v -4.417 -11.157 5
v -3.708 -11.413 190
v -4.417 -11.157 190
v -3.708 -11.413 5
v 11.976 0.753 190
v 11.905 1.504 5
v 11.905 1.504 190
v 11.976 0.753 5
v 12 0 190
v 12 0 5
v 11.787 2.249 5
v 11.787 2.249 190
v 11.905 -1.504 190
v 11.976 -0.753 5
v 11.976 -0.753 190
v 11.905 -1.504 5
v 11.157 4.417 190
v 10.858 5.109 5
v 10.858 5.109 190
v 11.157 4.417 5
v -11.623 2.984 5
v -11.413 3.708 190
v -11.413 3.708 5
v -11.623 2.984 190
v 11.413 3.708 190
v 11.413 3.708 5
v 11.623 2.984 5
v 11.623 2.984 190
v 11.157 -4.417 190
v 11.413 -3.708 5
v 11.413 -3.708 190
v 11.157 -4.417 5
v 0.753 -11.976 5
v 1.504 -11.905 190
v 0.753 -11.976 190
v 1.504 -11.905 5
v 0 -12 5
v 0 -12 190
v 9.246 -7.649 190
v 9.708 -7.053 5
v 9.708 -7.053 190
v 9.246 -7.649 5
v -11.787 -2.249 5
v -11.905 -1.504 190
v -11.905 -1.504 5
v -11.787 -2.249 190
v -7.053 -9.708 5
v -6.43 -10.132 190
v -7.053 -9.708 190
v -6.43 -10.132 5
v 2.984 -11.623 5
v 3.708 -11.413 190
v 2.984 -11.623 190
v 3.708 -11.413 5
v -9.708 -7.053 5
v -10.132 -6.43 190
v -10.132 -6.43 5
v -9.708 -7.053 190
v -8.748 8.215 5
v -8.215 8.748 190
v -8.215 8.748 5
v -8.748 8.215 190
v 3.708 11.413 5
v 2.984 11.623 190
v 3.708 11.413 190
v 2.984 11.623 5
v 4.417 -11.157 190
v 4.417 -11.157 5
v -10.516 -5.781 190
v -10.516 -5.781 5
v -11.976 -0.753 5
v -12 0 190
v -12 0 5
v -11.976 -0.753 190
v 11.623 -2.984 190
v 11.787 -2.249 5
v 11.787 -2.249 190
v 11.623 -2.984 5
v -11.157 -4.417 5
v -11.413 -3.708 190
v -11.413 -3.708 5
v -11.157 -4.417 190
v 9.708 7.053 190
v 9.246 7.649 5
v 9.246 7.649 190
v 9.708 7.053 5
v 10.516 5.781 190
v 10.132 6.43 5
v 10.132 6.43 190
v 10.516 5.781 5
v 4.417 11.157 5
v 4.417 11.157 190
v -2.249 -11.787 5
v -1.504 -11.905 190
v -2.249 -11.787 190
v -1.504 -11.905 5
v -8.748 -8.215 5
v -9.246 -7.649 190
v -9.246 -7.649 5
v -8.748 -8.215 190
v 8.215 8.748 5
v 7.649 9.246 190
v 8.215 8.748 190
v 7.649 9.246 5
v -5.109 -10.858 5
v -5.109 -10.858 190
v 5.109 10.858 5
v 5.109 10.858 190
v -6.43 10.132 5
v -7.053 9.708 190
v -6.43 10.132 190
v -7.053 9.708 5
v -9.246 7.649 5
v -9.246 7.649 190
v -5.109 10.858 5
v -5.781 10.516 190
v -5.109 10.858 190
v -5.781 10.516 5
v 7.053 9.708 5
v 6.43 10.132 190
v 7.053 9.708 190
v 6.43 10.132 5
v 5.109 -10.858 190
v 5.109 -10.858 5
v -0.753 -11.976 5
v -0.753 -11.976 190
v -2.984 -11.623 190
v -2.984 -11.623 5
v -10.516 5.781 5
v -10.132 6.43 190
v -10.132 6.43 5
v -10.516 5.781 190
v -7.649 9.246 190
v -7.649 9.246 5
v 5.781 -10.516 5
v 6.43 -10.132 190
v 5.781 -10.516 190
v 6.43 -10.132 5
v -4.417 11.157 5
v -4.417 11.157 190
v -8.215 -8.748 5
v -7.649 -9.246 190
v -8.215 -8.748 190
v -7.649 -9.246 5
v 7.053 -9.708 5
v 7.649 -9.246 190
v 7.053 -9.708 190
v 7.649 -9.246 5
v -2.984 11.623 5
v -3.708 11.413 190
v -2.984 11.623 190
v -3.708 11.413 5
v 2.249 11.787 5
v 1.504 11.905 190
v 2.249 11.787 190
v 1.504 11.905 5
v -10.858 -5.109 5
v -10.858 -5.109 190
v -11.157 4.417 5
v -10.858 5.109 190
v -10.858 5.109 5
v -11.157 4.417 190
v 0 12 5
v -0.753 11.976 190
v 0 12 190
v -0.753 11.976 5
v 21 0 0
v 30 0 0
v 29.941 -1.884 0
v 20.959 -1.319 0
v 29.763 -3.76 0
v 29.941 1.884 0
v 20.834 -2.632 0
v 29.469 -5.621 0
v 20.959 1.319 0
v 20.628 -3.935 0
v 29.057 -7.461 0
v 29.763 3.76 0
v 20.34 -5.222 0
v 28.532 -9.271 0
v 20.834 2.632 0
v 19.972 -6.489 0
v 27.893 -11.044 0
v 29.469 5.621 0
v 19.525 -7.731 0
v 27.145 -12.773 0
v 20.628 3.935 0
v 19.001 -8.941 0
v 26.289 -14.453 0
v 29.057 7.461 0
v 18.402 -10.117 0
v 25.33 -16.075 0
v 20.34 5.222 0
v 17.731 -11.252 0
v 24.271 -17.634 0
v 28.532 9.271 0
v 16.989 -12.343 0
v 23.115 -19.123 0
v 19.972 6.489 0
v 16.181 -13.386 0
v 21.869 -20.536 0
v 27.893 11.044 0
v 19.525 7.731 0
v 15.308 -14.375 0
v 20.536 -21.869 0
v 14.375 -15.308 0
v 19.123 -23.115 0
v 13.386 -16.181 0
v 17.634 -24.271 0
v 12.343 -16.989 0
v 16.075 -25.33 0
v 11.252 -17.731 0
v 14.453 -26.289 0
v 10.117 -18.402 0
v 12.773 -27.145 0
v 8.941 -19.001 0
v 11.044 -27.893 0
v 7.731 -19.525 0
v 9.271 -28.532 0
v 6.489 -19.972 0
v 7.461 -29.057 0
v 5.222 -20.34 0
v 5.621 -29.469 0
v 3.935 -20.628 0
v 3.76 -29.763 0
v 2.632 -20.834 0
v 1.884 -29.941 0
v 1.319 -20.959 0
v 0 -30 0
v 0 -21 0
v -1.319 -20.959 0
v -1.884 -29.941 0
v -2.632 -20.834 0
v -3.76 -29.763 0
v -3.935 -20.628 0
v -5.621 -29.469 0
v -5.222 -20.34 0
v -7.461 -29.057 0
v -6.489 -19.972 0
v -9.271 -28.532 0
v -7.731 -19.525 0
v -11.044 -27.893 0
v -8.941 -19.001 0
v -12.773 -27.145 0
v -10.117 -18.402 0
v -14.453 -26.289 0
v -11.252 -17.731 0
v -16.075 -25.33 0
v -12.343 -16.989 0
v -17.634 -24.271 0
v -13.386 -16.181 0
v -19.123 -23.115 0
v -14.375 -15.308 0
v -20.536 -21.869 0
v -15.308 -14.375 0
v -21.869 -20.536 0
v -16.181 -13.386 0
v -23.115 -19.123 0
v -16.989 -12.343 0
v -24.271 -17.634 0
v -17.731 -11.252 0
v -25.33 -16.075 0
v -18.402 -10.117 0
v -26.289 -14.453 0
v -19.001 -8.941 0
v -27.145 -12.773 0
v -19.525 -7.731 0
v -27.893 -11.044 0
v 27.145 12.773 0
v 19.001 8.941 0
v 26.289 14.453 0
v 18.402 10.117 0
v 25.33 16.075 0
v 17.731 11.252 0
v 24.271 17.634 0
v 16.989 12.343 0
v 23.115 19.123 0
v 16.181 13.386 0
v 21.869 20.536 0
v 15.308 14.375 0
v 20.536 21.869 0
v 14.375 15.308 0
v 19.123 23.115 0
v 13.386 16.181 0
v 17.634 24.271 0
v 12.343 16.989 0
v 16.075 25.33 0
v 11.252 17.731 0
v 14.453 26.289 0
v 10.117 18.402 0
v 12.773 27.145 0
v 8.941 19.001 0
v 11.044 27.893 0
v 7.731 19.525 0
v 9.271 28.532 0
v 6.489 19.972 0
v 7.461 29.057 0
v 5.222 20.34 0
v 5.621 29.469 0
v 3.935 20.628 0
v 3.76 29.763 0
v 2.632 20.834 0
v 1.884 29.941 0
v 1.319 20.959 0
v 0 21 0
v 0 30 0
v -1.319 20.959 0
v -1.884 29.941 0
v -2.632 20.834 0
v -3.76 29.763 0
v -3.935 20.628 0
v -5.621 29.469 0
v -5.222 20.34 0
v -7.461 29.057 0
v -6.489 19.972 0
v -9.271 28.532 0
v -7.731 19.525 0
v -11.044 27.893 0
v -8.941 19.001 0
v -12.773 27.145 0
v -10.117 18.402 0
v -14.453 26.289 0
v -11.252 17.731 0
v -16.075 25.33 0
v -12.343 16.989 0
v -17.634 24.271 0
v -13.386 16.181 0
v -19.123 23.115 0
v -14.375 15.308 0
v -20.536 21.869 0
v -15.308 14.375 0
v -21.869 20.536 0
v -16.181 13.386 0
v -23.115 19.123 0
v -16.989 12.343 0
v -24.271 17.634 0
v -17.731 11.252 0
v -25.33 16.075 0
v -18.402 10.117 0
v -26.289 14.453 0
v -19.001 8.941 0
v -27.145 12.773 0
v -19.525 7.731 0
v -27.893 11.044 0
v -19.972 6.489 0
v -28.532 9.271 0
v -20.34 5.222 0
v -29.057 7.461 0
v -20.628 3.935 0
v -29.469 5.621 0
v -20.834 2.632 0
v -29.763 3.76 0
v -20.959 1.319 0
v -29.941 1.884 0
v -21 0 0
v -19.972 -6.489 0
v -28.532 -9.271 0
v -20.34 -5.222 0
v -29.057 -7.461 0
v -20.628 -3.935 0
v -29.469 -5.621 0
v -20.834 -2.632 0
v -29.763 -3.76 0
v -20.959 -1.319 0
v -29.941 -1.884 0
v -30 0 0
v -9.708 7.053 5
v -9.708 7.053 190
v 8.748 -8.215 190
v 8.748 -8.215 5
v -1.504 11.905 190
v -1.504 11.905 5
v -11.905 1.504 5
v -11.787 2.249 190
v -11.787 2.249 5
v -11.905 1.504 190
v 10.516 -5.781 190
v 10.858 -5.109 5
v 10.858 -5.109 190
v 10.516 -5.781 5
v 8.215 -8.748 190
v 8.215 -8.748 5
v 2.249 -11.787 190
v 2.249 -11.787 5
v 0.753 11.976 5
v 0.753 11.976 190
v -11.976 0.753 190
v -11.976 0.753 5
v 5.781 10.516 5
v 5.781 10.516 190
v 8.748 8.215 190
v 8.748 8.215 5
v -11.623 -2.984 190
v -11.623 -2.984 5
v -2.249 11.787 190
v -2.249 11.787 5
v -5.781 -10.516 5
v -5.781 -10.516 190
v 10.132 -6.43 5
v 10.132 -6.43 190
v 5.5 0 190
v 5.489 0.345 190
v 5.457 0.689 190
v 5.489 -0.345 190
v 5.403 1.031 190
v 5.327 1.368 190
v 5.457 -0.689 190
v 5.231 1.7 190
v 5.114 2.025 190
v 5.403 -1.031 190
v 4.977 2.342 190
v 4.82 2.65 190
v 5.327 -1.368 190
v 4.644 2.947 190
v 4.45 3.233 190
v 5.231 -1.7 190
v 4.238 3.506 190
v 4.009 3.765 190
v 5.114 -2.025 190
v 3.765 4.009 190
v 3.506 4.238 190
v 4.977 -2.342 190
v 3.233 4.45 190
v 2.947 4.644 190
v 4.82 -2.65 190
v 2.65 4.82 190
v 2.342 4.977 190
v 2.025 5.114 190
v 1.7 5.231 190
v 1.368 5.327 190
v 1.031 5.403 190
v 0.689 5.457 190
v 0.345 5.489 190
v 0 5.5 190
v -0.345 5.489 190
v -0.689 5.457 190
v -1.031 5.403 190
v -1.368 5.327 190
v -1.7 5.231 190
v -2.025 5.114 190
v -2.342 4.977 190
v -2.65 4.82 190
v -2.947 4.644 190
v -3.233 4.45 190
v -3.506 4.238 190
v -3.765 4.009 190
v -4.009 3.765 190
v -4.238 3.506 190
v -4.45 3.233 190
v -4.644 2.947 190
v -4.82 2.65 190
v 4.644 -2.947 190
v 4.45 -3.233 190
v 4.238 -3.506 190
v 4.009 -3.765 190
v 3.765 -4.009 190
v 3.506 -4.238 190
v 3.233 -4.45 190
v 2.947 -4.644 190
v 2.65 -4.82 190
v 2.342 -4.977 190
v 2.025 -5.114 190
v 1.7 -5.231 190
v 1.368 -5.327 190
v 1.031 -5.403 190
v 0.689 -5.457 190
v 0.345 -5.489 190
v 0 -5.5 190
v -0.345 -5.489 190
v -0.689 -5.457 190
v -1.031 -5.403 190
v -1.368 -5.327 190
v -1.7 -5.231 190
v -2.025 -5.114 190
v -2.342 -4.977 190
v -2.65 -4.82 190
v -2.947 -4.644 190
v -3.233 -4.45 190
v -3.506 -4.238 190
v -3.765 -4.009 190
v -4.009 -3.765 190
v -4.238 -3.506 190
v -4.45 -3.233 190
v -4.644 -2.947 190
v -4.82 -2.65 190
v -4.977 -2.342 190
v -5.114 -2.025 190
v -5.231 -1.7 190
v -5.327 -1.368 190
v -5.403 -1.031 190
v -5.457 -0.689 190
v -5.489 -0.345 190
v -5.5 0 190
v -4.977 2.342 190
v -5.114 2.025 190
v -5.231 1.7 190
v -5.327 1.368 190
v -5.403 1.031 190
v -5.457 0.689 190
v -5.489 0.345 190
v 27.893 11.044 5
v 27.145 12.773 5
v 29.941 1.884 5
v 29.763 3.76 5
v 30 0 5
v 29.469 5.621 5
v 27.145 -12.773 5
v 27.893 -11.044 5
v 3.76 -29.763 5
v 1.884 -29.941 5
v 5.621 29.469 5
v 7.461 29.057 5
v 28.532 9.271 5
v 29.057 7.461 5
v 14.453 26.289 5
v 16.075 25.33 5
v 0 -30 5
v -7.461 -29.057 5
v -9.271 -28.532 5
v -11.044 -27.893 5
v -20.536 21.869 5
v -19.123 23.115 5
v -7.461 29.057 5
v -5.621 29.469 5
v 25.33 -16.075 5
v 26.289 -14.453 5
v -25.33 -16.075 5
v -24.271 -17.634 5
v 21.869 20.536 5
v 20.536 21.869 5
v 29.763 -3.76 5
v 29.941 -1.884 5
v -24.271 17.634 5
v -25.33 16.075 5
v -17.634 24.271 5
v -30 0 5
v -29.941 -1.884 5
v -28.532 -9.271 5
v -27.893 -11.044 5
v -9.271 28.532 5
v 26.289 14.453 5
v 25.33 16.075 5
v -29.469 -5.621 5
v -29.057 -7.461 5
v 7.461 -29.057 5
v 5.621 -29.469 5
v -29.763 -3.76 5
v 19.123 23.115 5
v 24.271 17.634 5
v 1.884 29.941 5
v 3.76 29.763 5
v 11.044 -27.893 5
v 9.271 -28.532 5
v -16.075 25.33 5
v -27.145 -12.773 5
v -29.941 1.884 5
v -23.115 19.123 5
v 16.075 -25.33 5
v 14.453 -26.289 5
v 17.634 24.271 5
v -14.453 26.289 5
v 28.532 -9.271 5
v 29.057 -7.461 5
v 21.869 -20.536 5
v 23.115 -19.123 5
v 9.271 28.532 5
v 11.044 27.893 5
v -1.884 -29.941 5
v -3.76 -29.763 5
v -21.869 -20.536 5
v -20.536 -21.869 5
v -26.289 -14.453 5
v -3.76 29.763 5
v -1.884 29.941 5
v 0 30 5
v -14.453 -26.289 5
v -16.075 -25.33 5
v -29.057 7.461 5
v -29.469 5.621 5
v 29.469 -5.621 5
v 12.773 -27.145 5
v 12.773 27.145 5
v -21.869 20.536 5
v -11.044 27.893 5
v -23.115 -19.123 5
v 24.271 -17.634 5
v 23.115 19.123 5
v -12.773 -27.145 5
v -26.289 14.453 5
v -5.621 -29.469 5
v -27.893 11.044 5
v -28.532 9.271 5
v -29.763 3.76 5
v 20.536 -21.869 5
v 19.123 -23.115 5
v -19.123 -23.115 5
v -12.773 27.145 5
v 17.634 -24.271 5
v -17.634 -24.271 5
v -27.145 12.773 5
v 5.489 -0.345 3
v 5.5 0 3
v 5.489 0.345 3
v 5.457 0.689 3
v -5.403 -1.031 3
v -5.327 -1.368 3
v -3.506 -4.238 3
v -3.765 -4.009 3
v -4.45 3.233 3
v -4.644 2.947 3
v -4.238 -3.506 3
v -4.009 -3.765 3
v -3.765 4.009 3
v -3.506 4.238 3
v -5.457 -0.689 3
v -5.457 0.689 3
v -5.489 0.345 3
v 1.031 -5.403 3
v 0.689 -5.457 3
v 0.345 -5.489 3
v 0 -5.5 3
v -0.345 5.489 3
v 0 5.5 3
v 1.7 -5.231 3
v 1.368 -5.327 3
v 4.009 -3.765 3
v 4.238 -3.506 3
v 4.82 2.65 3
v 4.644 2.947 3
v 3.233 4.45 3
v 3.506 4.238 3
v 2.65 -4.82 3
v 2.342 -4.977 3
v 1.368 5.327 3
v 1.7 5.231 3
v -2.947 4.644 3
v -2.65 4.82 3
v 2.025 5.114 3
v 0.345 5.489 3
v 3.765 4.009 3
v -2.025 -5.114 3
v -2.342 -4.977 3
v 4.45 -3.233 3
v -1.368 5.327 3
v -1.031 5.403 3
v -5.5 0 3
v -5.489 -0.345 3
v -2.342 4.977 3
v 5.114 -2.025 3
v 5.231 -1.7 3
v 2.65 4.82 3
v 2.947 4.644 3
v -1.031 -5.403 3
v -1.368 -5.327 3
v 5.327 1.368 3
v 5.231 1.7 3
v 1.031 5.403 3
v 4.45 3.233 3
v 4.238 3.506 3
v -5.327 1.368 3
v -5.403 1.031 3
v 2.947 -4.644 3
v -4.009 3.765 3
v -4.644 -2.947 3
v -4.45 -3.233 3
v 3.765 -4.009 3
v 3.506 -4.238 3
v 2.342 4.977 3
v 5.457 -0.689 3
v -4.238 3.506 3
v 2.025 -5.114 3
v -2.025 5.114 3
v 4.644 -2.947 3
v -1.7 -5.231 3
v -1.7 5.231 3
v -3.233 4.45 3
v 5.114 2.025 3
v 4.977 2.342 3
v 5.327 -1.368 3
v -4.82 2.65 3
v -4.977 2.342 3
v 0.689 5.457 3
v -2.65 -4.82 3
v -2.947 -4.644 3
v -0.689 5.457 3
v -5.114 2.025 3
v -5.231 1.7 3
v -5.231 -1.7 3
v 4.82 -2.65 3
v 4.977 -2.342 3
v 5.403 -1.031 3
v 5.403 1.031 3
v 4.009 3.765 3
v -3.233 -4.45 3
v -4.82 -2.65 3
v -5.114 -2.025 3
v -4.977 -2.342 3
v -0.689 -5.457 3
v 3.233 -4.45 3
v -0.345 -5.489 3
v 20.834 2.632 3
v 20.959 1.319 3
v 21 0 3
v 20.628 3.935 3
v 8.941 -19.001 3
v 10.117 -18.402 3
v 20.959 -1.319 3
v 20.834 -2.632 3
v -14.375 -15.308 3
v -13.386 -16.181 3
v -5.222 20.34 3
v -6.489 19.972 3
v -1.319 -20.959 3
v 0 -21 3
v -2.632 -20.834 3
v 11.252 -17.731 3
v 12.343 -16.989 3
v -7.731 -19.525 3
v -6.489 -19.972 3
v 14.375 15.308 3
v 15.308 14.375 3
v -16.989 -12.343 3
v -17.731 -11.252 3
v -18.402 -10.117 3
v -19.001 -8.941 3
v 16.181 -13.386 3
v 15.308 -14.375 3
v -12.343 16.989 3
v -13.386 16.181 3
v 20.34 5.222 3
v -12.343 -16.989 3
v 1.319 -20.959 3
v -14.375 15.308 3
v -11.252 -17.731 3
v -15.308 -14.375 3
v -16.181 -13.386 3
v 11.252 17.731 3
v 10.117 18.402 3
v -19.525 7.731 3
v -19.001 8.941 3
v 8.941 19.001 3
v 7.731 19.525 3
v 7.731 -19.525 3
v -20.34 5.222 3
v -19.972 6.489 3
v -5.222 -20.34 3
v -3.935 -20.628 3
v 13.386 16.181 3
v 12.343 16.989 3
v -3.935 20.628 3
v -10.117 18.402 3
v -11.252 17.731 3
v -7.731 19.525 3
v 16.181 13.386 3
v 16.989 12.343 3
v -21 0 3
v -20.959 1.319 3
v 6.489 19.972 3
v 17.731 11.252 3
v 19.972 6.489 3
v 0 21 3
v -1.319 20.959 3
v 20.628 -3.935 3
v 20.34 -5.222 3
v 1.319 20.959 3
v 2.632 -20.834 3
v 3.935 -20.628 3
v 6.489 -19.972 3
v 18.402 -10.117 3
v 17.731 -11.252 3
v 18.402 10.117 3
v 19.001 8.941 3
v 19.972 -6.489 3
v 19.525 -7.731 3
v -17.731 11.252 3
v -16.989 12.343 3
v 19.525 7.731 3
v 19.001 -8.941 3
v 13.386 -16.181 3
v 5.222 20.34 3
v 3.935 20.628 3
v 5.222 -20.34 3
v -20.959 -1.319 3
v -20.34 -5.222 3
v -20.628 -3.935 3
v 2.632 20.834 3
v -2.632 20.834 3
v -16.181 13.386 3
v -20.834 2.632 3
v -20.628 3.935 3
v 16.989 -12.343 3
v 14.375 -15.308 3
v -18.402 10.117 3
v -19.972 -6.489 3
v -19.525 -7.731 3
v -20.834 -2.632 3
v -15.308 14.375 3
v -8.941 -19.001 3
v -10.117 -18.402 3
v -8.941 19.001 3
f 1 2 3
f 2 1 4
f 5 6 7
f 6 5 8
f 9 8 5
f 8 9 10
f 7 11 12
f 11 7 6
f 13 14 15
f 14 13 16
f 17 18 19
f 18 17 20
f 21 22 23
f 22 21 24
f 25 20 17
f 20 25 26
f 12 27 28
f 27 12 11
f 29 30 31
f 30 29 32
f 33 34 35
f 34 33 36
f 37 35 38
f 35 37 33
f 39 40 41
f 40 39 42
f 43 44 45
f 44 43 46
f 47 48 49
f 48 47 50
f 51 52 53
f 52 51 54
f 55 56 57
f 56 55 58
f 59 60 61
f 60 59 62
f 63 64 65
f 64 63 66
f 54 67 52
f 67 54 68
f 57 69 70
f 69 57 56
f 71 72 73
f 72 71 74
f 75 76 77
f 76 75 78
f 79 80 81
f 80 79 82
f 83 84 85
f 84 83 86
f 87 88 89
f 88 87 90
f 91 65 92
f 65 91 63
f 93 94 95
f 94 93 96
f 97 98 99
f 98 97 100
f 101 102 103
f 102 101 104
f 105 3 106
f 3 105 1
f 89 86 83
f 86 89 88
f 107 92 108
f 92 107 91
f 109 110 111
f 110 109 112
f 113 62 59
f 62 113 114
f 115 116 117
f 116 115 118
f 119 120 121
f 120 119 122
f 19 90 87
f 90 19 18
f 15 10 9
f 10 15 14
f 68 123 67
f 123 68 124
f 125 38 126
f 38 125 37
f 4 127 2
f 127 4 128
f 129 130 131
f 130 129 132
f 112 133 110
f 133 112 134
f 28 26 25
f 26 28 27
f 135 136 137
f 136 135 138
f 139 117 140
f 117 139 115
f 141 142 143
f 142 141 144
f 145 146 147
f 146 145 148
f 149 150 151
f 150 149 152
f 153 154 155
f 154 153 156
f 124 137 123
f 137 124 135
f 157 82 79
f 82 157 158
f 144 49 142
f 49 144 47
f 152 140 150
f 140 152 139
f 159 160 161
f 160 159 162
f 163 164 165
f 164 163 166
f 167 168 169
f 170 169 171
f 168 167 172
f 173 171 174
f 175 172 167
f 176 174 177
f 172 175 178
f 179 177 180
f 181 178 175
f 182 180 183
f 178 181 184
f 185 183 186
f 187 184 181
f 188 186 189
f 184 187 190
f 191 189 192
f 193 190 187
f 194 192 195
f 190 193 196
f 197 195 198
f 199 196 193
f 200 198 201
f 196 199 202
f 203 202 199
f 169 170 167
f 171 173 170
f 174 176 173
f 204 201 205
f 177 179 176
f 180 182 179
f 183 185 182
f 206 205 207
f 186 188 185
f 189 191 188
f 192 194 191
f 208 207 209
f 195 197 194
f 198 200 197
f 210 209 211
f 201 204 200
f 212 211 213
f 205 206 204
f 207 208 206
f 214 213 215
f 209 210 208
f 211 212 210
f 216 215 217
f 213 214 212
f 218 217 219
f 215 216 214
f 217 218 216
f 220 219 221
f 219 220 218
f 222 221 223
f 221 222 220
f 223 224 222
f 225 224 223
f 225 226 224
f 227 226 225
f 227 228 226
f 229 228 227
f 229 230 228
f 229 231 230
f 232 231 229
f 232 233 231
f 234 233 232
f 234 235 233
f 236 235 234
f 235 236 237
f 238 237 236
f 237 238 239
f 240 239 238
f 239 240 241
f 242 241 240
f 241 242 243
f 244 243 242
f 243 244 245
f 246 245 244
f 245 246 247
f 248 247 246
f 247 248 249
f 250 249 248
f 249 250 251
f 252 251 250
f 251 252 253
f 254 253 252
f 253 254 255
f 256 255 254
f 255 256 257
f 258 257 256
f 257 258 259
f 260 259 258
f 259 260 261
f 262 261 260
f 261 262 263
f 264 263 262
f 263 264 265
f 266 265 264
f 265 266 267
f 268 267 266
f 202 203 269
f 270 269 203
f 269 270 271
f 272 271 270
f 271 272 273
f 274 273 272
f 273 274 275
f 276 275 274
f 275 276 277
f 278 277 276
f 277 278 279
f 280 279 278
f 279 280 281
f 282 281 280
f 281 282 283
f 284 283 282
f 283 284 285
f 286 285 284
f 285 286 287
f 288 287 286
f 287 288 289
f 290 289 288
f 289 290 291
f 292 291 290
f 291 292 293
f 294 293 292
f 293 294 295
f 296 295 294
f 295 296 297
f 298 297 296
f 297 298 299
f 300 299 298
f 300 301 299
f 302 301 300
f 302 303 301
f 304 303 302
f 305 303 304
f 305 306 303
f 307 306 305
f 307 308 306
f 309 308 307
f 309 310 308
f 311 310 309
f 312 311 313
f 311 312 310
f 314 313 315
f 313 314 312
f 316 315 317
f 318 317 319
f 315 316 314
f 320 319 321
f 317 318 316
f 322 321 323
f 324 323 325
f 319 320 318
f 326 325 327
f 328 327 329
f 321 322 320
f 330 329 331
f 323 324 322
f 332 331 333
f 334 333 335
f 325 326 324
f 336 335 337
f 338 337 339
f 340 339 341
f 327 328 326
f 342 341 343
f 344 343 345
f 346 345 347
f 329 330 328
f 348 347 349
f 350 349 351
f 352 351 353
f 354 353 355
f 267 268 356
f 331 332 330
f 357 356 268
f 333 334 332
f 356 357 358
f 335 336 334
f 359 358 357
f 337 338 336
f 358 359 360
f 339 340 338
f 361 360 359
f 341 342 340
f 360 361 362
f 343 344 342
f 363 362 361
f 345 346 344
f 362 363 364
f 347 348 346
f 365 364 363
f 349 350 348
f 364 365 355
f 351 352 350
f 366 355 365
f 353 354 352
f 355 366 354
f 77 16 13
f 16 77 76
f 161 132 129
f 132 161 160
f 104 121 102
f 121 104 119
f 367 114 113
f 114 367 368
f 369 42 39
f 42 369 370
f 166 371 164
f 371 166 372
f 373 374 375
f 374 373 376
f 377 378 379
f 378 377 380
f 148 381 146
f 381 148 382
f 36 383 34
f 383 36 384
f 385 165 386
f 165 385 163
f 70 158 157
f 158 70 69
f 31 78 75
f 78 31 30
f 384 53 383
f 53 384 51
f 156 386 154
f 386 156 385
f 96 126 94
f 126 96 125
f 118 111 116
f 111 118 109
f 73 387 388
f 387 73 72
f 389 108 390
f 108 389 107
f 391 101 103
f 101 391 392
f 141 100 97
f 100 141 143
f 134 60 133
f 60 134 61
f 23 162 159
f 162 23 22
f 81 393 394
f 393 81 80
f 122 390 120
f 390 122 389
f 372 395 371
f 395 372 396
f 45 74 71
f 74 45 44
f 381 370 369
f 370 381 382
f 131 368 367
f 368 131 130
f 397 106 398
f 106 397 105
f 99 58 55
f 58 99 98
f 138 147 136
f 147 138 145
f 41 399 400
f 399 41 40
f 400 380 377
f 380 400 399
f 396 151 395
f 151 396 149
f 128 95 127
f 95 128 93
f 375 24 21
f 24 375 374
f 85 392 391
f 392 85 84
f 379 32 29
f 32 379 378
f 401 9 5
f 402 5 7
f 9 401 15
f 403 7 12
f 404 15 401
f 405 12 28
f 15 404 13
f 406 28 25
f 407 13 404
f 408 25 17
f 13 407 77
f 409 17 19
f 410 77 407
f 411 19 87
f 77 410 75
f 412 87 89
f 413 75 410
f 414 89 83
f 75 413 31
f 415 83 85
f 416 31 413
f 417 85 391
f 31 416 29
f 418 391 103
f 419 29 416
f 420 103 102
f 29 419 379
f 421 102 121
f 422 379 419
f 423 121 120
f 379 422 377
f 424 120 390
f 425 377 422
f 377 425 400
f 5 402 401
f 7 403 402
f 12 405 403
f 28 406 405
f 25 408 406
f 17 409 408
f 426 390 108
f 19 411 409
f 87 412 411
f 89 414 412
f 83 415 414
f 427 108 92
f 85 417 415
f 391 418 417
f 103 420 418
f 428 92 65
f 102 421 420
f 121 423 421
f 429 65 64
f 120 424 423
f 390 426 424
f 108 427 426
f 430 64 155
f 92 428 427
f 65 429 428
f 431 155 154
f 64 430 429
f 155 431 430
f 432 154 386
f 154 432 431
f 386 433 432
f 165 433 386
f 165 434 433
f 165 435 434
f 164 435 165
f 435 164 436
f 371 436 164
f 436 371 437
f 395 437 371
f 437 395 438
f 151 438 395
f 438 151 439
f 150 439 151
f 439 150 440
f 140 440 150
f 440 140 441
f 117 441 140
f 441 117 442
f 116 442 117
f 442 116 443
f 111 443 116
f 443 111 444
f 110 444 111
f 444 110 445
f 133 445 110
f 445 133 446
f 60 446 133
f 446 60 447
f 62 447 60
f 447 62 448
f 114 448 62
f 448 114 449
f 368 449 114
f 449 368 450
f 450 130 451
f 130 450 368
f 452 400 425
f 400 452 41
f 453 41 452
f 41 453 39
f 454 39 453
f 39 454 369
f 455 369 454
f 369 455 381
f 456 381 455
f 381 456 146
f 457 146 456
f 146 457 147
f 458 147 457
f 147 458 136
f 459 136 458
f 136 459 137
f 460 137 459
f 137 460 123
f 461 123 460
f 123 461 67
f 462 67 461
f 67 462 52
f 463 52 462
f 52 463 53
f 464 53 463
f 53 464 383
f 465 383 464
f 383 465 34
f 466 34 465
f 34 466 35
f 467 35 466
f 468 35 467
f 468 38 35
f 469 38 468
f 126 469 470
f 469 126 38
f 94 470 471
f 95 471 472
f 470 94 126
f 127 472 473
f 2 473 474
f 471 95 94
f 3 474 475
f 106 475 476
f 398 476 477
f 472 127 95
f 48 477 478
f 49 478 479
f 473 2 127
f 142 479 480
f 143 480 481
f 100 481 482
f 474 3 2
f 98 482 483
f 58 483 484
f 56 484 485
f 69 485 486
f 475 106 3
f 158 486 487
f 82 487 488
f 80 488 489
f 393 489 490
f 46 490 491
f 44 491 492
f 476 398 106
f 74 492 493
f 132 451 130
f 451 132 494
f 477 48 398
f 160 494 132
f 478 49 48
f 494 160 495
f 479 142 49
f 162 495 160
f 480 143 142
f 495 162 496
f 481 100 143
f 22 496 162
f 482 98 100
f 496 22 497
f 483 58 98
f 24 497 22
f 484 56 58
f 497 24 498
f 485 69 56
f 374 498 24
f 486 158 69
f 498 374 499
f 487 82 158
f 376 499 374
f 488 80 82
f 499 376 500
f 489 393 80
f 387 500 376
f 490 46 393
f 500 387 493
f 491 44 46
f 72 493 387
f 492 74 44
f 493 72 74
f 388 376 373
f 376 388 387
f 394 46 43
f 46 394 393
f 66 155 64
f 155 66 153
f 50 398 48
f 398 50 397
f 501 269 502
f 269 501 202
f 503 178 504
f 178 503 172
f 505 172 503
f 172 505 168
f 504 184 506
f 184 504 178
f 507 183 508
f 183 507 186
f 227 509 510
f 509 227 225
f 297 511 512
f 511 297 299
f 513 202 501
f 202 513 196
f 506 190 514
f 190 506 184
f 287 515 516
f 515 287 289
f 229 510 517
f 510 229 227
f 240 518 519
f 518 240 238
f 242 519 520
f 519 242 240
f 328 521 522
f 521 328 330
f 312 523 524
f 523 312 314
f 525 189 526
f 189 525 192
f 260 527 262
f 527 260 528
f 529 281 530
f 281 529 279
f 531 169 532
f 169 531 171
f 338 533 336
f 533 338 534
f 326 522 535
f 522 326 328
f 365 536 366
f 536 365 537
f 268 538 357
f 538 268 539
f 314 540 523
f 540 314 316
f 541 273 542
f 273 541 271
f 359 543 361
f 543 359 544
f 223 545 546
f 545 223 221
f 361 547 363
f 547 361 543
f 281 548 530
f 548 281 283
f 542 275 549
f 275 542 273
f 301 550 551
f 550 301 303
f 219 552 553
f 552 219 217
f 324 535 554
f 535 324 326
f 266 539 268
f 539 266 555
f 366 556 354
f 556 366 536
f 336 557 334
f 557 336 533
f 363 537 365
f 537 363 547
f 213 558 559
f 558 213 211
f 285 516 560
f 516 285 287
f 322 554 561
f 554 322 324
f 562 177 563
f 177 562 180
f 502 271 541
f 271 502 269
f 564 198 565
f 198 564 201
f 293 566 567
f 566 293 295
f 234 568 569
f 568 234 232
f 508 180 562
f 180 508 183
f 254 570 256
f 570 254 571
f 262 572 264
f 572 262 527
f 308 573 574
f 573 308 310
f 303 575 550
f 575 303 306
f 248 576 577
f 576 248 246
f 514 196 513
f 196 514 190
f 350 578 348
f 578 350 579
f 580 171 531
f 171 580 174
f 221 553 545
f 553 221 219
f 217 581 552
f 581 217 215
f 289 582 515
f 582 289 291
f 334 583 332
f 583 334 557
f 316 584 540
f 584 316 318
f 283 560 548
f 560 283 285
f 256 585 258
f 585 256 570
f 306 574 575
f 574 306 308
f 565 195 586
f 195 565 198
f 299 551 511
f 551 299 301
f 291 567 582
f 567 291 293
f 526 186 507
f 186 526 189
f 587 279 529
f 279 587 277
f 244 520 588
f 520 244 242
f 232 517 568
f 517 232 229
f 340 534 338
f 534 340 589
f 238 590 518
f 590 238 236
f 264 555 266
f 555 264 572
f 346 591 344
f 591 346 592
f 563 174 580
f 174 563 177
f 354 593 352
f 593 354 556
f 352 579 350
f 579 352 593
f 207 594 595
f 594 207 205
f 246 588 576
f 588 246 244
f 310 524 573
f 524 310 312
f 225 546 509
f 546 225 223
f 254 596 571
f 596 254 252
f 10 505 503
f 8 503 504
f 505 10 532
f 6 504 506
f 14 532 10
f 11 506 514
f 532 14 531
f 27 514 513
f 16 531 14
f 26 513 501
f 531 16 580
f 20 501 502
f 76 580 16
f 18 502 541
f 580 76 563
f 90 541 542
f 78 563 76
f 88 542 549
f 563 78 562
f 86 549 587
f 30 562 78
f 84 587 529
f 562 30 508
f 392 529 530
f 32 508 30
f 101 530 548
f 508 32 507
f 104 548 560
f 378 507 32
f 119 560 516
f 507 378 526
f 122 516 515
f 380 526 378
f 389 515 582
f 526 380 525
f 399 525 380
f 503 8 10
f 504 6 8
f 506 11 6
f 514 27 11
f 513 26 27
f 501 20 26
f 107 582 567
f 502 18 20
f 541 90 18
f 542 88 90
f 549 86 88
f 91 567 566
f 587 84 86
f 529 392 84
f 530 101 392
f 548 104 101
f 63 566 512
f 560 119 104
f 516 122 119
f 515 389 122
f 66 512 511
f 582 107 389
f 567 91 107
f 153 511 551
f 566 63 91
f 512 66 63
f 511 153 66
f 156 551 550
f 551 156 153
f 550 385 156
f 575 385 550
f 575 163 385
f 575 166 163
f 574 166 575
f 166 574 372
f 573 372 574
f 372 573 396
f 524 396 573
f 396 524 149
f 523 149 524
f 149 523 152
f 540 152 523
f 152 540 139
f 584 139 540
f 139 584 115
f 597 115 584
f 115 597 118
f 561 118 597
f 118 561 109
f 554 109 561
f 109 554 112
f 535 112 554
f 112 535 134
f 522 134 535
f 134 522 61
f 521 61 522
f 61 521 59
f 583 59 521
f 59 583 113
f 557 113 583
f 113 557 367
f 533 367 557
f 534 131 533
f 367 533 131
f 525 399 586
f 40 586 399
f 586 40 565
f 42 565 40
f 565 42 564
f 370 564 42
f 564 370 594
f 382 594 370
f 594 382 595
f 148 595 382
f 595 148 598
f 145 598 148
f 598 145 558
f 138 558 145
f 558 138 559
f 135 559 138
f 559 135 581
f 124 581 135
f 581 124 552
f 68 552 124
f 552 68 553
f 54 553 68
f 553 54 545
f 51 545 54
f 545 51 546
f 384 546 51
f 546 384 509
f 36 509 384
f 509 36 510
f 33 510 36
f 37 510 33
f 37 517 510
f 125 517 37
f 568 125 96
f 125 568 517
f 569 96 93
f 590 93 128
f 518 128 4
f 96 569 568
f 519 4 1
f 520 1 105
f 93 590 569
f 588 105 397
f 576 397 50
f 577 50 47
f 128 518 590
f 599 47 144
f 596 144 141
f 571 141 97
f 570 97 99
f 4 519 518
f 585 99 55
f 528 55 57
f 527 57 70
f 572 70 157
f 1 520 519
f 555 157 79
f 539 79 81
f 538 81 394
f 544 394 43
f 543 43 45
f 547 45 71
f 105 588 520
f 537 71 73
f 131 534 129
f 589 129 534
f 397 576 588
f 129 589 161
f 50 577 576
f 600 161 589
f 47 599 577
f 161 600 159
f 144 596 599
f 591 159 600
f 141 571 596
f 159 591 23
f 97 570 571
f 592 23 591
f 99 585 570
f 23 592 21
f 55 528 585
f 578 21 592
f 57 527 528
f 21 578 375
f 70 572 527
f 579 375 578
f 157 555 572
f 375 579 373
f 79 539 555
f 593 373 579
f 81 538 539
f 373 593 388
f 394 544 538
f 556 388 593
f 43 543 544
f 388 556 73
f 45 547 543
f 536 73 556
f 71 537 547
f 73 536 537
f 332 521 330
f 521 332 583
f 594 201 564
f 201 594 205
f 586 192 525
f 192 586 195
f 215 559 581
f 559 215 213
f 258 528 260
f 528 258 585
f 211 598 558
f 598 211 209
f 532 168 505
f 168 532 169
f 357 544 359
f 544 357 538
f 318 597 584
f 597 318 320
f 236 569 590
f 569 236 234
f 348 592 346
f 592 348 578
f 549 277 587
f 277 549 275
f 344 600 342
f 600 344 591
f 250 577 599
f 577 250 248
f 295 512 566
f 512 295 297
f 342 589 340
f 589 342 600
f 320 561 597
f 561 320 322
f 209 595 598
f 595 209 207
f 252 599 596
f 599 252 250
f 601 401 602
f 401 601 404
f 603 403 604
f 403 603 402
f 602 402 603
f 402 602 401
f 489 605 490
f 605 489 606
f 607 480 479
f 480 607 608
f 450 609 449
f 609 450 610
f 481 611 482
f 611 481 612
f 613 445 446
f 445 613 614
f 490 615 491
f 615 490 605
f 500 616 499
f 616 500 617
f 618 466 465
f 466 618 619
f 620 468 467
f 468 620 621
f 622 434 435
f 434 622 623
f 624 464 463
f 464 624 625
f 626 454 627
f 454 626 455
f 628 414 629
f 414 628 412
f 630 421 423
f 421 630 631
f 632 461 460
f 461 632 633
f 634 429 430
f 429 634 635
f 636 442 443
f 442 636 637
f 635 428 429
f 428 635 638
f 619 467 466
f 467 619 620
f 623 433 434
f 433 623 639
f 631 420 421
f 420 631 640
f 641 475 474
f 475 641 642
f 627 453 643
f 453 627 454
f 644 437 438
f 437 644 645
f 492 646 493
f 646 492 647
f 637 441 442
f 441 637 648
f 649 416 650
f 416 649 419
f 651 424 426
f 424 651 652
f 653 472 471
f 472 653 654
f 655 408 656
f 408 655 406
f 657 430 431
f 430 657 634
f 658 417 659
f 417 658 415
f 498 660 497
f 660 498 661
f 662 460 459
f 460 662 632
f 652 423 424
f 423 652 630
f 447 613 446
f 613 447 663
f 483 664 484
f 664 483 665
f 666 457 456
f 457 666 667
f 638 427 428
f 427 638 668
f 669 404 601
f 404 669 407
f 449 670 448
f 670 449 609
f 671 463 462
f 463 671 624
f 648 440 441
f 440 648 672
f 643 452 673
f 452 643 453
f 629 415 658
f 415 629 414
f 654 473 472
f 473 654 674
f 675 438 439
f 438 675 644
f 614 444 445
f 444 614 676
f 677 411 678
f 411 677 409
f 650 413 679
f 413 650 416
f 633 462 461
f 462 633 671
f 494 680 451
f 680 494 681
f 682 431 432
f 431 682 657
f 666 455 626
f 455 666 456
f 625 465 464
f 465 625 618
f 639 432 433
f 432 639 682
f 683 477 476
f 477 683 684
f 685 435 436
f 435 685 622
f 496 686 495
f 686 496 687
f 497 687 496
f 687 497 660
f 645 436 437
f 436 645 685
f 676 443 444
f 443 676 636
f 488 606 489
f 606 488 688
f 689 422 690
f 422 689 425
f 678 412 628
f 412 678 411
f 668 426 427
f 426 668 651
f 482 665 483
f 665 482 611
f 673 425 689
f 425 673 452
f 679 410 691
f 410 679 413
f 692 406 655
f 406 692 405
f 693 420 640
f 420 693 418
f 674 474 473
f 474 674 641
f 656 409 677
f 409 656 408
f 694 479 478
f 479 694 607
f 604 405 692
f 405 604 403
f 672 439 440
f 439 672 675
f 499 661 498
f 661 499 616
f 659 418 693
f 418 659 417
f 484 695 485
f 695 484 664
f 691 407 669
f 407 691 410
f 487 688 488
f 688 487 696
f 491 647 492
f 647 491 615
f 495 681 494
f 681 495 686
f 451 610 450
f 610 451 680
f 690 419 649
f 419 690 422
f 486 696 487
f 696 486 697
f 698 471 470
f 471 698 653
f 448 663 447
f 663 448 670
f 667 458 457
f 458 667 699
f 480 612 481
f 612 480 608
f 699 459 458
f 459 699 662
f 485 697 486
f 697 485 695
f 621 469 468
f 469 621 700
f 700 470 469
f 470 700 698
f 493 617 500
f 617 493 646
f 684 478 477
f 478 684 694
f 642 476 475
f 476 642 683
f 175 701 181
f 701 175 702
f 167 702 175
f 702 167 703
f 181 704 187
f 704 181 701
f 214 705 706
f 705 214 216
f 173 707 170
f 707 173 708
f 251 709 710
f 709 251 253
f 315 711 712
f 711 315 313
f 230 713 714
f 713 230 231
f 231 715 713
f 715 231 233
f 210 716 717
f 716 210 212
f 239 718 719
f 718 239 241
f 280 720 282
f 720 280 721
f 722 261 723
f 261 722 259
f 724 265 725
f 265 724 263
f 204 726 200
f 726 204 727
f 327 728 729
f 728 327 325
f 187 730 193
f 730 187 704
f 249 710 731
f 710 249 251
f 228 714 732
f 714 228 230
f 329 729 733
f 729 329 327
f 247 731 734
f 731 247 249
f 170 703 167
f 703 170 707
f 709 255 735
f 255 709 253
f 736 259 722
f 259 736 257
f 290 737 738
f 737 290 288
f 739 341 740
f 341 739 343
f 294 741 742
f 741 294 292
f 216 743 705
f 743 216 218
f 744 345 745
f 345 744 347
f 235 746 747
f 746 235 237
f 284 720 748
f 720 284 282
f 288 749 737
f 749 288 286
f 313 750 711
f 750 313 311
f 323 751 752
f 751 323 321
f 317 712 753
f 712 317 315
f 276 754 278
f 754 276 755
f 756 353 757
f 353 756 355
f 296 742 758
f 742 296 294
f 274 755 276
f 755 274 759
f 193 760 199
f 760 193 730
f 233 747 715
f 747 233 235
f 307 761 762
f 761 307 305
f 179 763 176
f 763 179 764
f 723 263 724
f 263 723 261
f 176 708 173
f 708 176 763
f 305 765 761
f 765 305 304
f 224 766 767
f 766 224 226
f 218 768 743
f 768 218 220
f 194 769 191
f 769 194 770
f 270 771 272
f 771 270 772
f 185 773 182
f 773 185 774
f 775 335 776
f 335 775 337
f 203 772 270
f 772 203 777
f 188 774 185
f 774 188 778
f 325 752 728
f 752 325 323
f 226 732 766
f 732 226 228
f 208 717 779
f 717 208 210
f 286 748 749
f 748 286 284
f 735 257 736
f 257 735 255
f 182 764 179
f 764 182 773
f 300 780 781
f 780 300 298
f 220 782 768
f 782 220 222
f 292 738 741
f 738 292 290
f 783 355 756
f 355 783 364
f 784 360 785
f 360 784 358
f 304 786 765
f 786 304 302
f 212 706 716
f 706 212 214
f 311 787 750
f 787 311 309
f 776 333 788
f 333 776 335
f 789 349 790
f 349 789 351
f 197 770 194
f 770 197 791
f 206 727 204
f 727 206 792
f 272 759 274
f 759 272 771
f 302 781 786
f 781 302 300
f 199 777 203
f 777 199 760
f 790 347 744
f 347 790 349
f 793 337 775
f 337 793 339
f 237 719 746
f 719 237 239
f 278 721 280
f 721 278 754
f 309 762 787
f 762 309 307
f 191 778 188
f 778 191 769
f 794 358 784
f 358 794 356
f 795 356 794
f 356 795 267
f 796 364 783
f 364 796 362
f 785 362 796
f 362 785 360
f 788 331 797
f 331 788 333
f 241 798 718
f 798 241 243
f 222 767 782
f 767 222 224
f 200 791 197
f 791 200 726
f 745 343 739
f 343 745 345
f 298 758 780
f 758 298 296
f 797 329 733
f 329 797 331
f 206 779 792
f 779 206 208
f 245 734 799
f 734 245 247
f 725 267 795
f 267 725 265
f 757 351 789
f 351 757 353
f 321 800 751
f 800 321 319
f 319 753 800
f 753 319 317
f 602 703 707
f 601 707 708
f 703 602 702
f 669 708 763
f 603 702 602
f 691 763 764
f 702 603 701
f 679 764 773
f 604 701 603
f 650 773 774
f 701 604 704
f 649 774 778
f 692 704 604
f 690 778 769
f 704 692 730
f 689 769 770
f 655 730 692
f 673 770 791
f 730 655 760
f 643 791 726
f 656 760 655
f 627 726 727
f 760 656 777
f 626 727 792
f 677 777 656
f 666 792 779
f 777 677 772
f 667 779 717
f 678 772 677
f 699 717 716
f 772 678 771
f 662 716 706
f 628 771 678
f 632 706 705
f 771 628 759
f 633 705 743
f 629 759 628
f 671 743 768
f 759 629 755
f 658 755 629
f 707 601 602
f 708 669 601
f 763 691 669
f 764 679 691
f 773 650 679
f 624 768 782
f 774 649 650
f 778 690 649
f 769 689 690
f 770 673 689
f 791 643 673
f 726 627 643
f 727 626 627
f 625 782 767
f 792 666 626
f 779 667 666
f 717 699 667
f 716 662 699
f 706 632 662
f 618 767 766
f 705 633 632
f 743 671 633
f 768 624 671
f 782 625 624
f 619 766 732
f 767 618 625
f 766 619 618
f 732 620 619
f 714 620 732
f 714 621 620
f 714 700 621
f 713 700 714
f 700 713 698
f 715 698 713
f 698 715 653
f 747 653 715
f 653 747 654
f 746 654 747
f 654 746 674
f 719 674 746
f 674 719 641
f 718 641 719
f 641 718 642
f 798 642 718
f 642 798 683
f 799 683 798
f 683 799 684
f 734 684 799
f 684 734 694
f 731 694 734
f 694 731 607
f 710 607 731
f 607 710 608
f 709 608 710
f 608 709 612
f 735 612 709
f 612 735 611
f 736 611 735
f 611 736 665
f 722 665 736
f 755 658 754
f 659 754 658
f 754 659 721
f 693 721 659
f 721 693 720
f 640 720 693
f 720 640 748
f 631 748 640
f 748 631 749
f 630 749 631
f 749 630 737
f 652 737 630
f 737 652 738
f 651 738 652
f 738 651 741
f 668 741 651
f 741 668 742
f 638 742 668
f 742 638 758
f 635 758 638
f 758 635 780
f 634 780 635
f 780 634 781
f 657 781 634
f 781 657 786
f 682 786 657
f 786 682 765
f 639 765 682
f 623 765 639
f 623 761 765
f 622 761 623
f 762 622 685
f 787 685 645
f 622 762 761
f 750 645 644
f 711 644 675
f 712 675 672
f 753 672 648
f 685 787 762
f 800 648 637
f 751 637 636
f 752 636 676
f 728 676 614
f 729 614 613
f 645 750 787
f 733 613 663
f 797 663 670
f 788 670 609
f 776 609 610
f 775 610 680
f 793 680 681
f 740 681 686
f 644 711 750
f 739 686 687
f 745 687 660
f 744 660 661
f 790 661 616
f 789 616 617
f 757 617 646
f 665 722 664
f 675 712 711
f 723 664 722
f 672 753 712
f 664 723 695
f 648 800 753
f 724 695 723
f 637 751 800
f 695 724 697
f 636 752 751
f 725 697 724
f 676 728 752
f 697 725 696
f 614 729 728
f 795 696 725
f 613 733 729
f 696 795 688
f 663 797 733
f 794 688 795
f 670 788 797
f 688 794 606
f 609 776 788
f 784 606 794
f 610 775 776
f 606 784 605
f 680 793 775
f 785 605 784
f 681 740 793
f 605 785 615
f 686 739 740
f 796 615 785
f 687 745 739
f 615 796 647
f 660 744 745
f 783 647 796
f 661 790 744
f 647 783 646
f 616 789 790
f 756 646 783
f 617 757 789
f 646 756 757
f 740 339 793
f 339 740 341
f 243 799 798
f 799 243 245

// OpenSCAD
OUTER_DIA = 24;
INNER_DIA = 11;
HEIGHT = 190;

BASE_DIA = 60;
BASE_THICKNESS = 5;
BASE_SUPPORT_DIA = 42;
BASE_SUPPORT_THICKNESS = 3;

$fn = 100;

difference() {
    union() {
        cylinder(d = OUTER_DIA, h = HEIGHT);
        cylinder(d = BASE_DIA, h = BASE_THICKNESS);
    }
    cylinder(d = INNER_DIA, h = HEIGHT);
    cylinder(d = BASE_SUPPORT_DIA, h = BASE_SUPPORT_THICKNESS);
}
